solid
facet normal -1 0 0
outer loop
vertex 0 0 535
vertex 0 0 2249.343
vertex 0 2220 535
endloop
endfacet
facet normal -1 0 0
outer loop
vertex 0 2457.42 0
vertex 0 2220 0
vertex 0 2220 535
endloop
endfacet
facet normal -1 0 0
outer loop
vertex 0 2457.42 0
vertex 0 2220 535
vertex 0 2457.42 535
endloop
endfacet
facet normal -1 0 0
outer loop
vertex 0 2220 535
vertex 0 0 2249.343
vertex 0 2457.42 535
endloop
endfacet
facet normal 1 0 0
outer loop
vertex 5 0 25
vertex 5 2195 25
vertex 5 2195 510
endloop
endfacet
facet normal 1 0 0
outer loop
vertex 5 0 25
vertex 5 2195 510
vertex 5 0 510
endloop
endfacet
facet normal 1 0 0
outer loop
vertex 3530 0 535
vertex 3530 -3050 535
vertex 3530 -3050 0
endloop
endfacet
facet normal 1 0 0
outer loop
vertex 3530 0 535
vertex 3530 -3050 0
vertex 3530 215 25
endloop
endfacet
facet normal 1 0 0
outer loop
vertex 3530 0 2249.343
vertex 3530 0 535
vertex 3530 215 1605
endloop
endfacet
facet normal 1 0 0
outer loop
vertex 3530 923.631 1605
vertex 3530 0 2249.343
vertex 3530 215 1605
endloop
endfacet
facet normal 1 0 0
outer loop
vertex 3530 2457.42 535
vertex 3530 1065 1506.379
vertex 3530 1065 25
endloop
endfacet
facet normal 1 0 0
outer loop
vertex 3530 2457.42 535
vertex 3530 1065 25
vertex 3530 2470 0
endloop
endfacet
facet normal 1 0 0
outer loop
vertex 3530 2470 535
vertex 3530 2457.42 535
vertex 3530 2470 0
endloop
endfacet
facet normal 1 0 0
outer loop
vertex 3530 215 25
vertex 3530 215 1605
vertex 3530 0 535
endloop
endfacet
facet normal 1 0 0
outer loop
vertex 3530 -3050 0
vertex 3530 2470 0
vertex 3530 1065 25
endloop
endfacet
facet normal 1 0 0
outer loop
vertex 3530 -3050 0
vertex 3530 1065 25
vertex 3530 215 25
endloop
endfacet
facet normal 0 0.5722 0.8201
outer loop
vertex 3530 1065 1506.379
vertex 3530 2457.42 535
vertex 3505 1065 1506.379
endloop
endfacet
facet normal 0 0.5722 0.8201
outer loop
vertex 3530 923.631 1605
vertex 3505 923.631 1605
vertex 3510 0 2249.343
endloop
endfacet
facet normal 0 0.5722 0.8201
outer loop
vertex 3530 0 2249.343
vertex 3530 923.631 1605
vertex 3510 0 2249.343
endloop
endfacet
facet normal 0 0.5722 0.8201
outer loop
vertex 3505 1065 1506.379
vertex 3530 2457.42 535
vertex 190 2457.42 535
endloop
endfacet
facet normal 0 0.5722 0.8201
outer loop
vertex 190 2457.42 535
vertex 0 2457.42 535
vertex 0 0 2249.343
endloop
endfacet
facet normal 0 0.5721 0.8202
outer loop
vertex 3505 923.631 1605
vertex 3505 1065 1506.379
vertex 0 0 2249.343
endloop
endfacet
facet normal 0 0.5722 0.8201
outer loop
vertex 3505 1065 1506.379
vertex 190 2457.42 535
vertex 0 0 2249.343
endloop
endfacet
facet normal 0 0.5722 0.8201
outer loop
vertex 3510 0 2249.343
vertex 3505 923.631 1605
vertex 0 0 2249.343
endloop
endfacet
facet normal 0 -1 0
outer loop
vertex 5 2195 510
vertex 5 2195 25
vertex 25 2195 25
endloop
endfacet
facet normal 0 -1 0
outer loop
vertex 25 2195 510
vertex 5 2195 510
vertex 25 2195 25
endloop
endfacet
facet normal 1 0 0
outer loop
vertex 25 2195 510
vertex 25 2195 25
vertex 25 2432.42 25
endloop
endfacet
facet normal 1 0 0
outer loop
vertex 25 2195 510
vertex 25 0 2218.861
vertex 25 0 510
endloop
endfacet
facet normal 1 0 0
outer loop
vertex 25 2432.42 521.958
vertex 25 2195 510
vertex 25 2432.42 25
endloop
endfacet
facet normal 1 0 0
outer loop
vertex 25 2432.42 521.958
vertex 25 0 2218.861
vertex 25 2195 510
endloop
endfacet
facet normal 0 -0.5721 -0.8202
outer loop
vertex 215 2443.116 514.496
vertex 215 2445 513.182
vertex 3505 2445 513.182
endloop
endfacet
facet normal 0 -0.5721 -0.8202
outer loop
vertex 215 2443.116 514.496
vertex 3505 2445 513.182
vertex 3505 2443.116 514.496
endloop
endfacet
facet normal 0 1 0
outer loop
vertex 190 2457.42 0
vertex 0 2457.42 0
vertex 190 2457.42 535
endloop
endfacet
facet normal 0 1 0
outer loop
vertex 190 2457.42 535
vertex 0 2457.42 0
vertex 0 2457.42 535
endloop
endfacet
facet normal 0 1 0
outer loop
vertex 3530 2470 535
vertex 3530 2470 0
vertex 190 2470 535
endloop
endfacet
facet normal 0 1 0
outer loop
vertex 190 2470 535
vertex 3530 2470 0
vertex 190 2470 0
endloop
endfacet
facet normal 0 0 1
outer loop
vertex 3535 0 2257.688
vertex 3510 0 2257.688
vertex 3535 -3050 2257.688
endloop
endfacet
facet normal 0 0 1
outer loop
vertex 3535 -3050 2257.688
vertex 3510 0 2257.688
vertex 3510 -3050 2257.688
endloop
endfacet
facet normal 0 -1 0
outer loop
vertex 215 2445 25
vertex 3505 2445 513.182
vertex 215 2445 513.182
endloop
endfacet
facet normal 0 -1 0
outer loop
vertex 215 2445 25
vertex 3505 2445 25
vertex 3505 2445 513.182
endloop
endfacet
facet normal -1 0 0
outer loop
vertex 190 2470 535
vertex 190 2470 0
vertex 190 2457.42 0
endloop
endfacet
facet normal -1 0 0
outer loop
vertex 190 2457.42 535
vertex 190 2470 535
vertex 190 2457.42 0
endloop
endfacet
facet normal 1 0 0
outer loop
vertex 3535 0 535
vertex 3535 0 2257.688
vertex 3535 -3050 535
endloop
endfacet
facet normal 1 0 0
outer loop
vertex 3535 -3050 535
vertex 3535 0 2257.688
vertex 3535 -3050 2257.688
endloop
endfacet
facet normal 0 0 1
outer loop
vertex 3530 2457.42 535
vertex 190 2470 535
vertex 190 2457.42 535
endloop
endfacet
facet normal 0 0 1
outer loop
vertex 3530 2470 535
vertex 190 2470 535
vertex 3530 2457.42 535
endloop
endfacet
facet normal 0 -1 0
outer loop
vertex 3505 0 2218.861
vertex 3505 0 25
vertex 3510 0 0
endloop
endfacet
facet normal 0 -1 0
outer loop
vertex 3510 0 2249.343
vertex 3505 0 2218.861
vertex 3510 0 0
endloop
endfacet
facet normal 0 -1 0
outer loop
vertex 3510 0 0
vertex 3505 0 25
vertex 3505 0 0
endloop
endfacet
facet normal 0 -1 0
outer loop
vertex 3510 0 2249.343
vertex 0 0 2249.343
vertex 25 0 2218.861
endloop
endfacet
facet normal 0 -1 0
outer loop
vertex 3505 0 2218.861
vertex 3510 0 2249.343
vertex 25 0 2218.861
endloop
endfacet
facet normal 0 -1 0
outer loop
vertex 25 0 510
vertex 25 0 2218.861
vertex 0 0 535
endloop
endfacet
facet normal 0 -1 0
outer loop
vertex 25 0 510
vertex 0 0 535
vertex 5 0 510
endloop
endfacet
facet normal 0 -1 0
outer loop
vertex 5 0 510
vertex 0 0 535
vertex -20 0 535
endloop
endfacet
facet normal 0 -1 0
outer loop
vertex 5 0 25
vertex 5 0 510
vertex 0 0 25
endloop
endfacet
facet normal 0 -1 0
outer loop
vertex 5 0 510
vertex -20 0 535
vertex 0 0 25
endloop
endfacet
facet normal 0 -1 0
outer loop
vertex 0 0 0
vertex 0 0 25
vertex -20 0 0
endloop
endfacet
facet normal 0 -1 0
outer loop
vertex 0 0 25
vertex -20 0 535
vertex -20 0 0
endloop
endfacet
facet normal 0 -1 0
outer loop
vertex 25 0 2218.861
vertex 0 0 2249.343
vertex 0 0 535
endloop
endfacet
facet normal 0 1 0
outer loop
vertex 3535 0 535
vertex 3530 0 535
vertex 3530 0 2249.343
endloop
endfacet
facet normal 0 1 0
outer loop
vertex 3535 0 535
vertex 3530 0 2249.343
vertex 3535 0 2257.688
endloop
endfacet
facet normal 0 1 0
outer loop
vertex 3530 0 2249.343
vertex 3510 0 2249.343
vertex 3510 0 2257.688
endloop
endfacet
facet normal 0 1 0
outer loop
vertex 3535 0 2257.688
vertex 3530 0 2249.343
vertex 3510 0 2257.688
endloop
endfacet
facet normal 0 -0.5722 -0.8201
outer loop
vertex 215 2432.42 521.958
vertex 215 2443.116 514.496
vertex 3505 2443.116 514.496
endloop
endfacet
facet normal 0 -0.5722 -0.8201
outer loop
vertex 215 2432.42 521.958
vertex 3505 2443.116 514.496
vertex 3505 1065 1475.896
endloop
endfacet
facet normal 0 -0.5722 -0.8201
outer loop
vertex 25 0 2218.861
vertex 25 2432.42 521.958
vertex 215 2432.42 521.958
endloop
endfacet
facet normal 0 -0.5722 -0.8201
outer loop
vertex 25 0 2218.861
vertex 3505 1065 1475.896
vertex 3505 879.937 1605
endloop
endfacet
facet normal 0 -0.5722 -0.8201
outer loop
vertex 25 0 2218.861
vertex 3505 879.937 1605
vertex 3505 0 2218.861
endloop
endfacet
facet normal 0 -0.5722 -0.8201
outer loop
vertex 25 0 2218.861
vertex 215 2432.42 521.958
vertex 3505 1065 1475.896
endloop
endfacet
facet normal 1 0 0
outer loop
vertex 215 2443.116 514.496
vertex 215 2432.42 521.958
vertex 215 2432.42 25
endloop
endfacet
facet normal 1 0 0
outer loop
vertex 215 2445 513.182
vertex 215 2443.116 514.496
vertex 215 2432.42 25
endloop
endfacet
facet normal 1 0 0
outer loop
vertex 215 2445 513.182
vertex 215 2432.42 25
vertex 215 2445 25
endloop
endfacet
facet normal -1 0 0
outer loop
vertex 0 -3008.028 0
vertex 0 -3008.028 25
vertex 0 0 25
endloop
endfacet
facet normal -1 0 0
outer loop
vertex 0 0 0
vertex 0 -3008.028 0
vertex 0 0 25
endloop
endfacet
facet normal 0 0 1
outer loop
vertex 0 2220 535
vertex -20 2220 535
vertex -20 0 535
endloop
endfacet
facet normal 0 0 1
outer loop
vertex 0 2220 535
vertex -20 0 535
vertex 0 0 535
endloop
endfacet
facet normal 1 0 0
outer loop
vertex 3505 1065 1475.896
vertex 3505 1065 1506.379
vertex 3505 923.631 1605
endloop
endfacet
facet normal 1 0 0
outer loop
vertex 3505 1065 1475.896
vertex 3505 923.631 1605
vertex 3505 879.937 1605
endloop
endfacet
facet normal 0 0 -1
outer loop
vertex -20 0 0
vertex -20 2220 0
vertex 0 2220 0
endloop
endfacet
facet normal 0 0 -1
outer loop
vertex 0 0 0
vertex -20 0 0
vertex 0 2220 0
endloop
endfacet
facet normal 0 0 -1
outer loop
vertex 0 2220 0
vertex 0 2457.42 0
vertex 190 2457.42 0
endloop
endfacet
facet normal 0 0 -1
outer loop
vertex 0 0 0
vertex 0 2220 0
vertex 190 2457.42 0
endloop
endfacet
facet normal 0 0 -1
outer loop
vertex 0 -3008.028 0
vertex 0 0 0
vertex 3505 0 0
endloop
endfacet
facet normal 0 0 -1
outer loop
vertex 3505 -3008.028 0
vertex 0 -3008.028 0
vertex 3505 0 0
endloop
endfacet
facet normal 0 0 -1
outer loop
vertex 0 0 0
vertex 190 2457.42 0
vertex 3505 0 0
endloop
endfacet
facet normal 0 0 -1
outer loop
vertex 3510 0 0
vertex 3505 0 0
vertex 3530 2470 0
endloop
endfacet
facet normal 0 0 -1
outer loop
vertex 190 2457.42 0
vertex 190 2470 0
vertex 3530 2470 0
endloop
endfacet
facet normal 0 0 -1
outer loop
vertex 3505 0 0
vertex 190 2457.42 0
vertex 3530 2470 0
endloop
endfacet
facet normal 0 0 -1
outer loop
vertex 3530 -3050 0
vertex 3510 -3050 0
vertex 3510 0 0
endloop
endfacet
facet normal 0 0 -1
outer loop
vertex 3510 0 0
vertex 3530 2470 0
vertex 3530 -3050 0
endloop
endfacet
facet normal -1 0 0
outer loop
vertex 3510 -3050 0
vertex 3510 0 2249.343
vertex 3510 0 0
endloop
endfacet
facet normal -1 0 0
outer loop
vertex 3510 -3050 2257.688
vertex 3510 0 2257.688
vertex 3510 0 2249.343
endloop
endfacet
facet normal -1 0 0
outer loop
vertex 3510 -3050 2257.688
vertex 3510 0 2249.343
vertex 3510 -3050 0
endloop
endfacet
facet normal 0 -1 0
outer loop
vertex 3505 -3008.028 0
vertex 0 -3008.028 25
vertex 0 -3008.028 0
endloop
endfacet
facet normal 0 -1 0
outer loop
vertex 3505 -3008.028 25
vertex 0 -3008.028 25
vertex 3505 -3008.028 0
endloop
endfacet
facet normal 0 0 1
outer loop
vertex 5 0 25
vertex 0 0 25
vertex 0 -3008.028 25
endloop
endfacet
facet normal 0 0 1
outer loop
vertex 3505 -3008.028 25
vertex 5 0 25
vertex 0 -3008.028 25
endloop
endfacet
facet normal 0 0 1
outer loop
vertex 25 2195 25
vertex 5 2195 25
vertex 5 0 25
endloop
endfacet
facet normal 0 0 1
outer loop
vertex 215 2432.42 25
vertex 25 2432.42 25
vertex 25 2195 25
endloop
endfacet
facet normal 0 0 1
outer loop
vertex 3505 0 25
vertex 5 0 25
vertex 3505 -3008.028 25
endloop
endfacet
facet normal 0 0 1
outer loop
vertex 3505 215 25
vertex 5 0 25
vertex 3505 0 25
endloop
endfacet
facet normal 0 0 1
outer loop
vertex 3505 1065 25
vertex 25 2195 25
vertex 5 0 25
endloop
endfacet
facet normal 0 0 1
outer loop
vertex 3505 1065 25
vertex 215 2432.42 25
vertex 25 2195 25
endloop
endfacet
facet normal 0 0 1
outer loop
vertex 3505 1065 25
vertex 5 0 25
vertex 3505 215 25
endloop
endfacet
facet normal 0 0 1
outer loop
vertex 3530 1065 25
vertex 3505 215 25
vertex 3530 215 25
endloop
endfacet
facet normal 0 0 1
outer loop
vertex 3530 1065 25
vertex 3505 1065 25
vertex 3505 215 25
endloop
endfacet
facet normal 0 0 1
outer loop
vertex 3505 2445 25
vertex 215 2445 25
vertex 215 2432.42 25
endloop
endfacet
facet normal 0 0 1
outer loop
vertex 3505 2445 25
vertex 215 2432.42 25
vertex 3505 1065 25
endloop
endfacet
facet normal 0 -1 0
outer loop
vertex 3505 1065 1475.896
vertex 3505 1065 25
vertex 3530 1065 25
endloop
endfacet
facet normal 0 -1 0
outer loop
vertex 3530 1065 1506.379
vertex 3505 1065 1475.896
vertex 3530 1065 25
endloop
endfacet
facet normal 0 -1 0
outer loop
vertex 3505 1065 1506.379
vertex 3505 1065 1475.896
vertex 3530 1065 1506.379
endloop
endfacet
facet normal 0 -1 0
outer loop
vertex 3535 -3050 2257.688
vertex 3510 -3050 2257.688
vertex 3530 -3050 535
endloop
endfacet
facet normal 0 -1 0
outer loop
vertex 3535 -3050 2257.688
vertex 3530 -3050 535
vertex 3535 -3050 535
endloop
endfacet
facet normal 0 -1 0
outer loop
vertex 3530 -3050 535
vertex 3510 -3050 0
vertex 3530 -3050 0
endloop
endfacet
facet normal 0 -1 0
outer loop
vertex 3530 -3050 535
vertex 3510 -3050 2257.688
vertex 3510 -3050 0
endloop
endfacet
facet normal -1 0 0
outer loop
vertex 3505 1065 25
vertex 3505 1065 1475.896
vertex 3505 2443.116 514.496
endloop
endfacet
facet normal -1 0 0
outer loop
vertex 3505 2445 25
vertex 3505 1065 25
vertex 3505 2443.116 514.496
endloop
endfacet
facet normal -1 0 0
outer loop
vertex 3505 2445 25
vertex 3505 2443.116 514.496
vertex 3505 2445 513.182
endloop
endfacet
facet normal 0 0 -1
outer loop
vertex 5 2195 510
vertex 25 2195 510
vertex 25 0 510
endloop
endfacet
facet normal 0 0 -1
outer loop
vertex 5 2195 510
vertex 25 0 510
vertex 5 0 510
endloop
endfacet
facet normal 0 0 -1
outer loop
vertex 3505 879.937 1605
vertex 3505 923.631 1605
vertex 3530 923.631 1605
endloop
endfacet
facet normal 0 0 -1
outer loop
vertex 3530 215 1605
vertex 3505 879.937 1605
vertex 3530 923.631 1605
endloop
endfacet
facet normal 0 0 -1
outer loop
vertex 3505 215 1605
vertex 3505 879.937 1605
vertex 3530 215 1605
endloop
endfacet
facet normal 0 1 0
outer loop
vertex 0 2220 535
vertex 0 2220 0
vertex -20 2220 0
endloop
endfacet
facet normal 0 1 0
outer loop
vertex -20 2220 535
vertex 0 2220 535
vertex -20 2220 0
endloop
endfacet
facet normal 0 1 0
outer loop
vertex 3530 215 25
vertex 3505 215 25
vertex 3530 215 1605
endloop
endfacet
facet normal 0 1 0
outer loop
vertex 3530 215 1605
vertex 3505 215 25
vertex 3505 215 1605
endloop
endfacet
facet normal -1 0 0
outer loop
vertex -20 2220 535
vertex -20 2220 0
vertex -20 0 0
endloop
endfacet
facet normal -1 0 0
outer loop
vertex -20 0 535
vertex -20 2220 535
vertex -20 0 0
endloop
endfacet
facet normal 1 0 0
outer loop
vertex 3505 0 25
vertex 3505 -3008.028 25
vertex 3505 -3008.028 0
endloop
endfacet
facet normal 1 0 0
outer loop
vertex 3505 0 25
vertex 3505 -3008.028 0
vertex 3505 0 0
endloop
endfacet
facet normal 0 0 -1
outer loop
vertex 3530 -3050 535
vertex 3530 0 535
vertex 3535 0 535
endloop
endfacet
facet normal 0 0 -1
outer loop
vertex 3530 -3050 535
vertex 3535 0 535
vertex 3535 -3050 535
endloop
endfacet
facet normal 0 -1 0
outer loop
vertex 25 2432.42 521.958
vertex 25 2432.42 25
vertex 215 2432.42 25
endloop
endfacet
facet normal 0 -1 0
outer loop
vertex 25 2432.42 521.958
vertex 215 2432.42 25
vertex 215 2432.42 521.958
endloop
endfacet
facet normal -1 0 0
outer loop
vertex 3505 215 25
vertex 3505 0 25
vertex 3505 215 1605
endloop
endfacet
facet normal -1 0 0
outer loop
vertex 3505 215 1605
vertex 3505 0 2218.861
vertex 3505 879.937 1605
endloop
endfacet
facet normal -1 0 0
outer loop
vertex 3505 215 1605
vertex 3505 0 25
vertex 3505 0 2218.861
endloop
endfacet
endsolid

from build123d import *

# Parameters (mm, degrees)
F1_DEPTH    = 535
F3_DEPTH    = 3530
F4_T        = 25
F4_T3_DEPTH = 585
F4_T5_DEPTH = 3390
F4_T7_DEPTH = 2270
F5_W        = 3050
F5_H        = 1722.6878070831
F6_DEPTH    = 25
F7_W        = 850
F7_H        = 1580
F8_DEPTH    = 25
F9_W        = 3505
F9_H        = 3008.0275535583
F10_DEPTH   = 25


# Not quite as in the source:
# - a shell that OpenCascade refuses in one call is made with other operations: the cavity is built on its own and cut out


with BuildPart() as f1:
    # F0 (on Top) → F1 (new body)
    with BuildSketch(Plane.XY):
        Polygon((-20, 0), (0, 0), (0, 2200), (210, 2200), (210, 2450), (3510, 2450), (3510, -3050), (3530, -3050), (3530, 2470), (190, 2470), (190, 2220), (-20, 2220), align=None)
    extrude(amount=F1_DEPTH)

    # F2 (on face) → F3 (join)
    with BuildSketch(Plane.YZ):
        Polygon((0, 2249.3429109028), (0, 0), (2457.4198722839, 0), (2457.4198722839, 535), align=None)
    extrude(amount=F3_DEPTH)

    # F4: shell of thickness 25, made by hand


with BuildPart() as f4_core1:
    # F4_t2: copy of F1
    add(f1.part)

    # the walls: a layer under each face that stays
    f4_faces = [f4_core1.faces().sort_by_distance(p)[0] for p in [
        (571.6666666667, 1550, 0),
        (-10, 2220, 267.5),
        (95, 2457.4198722839, 267.5),
        (190, 2463.709936142, 267.5),
        (1860, 2463.709936142, 535),
        (1860, 2470, 267.5),
        (3520, -3050, 267.5),
        (3510, -1525, 267.5),
        (3520, -1525, 535),
        (3530, -2130, 374.8904851505),
        (1765, 1228.709936142, 1392.1714554514),
        (0, 1228.709936142, 1124.6714554514),
        (-10, 1110, 535),
        (-20, 1110, 267.5),
    ]]
    thicken(f4_faces, amount=-F4_T, mode=Mode.SUBTRACT)

    # F4_s4 → F4_t3 (cut)
    with BuildSketch(Plane.XY.offset(-25)):
        Polygon((-0.25, 2220.25), (0, 2195), (25, 2195), (25, 2220), align=None)
        Polygon((189.75, 2457.6698722839), (190, 2432.4198722839), (215, 2432.4198722839), (215, 2457.4198722839), align=None)
    extrude(amount=F4_T3_DEPTH, mode=Mode.SUBTRACT)

    # F4_s6 → F4_t5 (cut)
    with BuildSketch(Plane.YZ.offset(165)):
        Polygon((2457.5629100467, 535.455037066), (2457.4198722839, 510), (2449.5612947416, 510), (2443.1160960124, 514.4962933992), align=None)
    extrude(amount=F4_T5_DEPTH, mode=Mode.SUBTRACT)

    # F4_s8 → F4_t7 (cut)
    with BuildSketch(Plane.XZ.offset(-2245)):
        Polygon((-0.25, 535.25), (25, 535), (25, 510), (0, 510), align=None)
    extrude(amount=F4_T7_DEPTH, mode=Mode.SUBTRACT)


with BuildPart() as f1_1:
    add(f1.part)

    # what is left inside the walls is the cavity
    f4_cavity = [f4_core1.part.solids().sort_by_distance(p)[0] for p in [
        (2345, 1221.41501, 1366.473418),
    ]]
    add(f4_cavity, mode=Mode.SUBTRACT)

    # F5 (on face) → F6 (join)
    with BuildSketch(Plane(origin=(3510, 0, 0), x_dir=(0, -1, 0), z_dir=(-1, 0, 0))):
        with Locations((1525, 1396.3439035416)):
            Rectangle(F5_W, F5_H)
    extrude(amount=-F6_DEPTH)

    # F7 (on face) → F8 (cut)
    with BuildSketch(Plane(origin=(3505, 0, 0), x_dir=(0, -1, 0), z_dir=(-1, 0, 0))):
        with Locations((-640, 815)):
            Rectangle(F7_W, F7_H)
    extrude(amount=-F8_DEPTH, mode=Mode.SUBTRACT)

    # F9 (on face) → F10 (join)
    with BuildSketch(Plane.XY.offset(25)):
        with Locations((1752.5, -1504.0137767792)):
            Rectangle(F9_W, F9_H)
    extrude(amount=-F10_DEPTH)


solid = f1_1.part
